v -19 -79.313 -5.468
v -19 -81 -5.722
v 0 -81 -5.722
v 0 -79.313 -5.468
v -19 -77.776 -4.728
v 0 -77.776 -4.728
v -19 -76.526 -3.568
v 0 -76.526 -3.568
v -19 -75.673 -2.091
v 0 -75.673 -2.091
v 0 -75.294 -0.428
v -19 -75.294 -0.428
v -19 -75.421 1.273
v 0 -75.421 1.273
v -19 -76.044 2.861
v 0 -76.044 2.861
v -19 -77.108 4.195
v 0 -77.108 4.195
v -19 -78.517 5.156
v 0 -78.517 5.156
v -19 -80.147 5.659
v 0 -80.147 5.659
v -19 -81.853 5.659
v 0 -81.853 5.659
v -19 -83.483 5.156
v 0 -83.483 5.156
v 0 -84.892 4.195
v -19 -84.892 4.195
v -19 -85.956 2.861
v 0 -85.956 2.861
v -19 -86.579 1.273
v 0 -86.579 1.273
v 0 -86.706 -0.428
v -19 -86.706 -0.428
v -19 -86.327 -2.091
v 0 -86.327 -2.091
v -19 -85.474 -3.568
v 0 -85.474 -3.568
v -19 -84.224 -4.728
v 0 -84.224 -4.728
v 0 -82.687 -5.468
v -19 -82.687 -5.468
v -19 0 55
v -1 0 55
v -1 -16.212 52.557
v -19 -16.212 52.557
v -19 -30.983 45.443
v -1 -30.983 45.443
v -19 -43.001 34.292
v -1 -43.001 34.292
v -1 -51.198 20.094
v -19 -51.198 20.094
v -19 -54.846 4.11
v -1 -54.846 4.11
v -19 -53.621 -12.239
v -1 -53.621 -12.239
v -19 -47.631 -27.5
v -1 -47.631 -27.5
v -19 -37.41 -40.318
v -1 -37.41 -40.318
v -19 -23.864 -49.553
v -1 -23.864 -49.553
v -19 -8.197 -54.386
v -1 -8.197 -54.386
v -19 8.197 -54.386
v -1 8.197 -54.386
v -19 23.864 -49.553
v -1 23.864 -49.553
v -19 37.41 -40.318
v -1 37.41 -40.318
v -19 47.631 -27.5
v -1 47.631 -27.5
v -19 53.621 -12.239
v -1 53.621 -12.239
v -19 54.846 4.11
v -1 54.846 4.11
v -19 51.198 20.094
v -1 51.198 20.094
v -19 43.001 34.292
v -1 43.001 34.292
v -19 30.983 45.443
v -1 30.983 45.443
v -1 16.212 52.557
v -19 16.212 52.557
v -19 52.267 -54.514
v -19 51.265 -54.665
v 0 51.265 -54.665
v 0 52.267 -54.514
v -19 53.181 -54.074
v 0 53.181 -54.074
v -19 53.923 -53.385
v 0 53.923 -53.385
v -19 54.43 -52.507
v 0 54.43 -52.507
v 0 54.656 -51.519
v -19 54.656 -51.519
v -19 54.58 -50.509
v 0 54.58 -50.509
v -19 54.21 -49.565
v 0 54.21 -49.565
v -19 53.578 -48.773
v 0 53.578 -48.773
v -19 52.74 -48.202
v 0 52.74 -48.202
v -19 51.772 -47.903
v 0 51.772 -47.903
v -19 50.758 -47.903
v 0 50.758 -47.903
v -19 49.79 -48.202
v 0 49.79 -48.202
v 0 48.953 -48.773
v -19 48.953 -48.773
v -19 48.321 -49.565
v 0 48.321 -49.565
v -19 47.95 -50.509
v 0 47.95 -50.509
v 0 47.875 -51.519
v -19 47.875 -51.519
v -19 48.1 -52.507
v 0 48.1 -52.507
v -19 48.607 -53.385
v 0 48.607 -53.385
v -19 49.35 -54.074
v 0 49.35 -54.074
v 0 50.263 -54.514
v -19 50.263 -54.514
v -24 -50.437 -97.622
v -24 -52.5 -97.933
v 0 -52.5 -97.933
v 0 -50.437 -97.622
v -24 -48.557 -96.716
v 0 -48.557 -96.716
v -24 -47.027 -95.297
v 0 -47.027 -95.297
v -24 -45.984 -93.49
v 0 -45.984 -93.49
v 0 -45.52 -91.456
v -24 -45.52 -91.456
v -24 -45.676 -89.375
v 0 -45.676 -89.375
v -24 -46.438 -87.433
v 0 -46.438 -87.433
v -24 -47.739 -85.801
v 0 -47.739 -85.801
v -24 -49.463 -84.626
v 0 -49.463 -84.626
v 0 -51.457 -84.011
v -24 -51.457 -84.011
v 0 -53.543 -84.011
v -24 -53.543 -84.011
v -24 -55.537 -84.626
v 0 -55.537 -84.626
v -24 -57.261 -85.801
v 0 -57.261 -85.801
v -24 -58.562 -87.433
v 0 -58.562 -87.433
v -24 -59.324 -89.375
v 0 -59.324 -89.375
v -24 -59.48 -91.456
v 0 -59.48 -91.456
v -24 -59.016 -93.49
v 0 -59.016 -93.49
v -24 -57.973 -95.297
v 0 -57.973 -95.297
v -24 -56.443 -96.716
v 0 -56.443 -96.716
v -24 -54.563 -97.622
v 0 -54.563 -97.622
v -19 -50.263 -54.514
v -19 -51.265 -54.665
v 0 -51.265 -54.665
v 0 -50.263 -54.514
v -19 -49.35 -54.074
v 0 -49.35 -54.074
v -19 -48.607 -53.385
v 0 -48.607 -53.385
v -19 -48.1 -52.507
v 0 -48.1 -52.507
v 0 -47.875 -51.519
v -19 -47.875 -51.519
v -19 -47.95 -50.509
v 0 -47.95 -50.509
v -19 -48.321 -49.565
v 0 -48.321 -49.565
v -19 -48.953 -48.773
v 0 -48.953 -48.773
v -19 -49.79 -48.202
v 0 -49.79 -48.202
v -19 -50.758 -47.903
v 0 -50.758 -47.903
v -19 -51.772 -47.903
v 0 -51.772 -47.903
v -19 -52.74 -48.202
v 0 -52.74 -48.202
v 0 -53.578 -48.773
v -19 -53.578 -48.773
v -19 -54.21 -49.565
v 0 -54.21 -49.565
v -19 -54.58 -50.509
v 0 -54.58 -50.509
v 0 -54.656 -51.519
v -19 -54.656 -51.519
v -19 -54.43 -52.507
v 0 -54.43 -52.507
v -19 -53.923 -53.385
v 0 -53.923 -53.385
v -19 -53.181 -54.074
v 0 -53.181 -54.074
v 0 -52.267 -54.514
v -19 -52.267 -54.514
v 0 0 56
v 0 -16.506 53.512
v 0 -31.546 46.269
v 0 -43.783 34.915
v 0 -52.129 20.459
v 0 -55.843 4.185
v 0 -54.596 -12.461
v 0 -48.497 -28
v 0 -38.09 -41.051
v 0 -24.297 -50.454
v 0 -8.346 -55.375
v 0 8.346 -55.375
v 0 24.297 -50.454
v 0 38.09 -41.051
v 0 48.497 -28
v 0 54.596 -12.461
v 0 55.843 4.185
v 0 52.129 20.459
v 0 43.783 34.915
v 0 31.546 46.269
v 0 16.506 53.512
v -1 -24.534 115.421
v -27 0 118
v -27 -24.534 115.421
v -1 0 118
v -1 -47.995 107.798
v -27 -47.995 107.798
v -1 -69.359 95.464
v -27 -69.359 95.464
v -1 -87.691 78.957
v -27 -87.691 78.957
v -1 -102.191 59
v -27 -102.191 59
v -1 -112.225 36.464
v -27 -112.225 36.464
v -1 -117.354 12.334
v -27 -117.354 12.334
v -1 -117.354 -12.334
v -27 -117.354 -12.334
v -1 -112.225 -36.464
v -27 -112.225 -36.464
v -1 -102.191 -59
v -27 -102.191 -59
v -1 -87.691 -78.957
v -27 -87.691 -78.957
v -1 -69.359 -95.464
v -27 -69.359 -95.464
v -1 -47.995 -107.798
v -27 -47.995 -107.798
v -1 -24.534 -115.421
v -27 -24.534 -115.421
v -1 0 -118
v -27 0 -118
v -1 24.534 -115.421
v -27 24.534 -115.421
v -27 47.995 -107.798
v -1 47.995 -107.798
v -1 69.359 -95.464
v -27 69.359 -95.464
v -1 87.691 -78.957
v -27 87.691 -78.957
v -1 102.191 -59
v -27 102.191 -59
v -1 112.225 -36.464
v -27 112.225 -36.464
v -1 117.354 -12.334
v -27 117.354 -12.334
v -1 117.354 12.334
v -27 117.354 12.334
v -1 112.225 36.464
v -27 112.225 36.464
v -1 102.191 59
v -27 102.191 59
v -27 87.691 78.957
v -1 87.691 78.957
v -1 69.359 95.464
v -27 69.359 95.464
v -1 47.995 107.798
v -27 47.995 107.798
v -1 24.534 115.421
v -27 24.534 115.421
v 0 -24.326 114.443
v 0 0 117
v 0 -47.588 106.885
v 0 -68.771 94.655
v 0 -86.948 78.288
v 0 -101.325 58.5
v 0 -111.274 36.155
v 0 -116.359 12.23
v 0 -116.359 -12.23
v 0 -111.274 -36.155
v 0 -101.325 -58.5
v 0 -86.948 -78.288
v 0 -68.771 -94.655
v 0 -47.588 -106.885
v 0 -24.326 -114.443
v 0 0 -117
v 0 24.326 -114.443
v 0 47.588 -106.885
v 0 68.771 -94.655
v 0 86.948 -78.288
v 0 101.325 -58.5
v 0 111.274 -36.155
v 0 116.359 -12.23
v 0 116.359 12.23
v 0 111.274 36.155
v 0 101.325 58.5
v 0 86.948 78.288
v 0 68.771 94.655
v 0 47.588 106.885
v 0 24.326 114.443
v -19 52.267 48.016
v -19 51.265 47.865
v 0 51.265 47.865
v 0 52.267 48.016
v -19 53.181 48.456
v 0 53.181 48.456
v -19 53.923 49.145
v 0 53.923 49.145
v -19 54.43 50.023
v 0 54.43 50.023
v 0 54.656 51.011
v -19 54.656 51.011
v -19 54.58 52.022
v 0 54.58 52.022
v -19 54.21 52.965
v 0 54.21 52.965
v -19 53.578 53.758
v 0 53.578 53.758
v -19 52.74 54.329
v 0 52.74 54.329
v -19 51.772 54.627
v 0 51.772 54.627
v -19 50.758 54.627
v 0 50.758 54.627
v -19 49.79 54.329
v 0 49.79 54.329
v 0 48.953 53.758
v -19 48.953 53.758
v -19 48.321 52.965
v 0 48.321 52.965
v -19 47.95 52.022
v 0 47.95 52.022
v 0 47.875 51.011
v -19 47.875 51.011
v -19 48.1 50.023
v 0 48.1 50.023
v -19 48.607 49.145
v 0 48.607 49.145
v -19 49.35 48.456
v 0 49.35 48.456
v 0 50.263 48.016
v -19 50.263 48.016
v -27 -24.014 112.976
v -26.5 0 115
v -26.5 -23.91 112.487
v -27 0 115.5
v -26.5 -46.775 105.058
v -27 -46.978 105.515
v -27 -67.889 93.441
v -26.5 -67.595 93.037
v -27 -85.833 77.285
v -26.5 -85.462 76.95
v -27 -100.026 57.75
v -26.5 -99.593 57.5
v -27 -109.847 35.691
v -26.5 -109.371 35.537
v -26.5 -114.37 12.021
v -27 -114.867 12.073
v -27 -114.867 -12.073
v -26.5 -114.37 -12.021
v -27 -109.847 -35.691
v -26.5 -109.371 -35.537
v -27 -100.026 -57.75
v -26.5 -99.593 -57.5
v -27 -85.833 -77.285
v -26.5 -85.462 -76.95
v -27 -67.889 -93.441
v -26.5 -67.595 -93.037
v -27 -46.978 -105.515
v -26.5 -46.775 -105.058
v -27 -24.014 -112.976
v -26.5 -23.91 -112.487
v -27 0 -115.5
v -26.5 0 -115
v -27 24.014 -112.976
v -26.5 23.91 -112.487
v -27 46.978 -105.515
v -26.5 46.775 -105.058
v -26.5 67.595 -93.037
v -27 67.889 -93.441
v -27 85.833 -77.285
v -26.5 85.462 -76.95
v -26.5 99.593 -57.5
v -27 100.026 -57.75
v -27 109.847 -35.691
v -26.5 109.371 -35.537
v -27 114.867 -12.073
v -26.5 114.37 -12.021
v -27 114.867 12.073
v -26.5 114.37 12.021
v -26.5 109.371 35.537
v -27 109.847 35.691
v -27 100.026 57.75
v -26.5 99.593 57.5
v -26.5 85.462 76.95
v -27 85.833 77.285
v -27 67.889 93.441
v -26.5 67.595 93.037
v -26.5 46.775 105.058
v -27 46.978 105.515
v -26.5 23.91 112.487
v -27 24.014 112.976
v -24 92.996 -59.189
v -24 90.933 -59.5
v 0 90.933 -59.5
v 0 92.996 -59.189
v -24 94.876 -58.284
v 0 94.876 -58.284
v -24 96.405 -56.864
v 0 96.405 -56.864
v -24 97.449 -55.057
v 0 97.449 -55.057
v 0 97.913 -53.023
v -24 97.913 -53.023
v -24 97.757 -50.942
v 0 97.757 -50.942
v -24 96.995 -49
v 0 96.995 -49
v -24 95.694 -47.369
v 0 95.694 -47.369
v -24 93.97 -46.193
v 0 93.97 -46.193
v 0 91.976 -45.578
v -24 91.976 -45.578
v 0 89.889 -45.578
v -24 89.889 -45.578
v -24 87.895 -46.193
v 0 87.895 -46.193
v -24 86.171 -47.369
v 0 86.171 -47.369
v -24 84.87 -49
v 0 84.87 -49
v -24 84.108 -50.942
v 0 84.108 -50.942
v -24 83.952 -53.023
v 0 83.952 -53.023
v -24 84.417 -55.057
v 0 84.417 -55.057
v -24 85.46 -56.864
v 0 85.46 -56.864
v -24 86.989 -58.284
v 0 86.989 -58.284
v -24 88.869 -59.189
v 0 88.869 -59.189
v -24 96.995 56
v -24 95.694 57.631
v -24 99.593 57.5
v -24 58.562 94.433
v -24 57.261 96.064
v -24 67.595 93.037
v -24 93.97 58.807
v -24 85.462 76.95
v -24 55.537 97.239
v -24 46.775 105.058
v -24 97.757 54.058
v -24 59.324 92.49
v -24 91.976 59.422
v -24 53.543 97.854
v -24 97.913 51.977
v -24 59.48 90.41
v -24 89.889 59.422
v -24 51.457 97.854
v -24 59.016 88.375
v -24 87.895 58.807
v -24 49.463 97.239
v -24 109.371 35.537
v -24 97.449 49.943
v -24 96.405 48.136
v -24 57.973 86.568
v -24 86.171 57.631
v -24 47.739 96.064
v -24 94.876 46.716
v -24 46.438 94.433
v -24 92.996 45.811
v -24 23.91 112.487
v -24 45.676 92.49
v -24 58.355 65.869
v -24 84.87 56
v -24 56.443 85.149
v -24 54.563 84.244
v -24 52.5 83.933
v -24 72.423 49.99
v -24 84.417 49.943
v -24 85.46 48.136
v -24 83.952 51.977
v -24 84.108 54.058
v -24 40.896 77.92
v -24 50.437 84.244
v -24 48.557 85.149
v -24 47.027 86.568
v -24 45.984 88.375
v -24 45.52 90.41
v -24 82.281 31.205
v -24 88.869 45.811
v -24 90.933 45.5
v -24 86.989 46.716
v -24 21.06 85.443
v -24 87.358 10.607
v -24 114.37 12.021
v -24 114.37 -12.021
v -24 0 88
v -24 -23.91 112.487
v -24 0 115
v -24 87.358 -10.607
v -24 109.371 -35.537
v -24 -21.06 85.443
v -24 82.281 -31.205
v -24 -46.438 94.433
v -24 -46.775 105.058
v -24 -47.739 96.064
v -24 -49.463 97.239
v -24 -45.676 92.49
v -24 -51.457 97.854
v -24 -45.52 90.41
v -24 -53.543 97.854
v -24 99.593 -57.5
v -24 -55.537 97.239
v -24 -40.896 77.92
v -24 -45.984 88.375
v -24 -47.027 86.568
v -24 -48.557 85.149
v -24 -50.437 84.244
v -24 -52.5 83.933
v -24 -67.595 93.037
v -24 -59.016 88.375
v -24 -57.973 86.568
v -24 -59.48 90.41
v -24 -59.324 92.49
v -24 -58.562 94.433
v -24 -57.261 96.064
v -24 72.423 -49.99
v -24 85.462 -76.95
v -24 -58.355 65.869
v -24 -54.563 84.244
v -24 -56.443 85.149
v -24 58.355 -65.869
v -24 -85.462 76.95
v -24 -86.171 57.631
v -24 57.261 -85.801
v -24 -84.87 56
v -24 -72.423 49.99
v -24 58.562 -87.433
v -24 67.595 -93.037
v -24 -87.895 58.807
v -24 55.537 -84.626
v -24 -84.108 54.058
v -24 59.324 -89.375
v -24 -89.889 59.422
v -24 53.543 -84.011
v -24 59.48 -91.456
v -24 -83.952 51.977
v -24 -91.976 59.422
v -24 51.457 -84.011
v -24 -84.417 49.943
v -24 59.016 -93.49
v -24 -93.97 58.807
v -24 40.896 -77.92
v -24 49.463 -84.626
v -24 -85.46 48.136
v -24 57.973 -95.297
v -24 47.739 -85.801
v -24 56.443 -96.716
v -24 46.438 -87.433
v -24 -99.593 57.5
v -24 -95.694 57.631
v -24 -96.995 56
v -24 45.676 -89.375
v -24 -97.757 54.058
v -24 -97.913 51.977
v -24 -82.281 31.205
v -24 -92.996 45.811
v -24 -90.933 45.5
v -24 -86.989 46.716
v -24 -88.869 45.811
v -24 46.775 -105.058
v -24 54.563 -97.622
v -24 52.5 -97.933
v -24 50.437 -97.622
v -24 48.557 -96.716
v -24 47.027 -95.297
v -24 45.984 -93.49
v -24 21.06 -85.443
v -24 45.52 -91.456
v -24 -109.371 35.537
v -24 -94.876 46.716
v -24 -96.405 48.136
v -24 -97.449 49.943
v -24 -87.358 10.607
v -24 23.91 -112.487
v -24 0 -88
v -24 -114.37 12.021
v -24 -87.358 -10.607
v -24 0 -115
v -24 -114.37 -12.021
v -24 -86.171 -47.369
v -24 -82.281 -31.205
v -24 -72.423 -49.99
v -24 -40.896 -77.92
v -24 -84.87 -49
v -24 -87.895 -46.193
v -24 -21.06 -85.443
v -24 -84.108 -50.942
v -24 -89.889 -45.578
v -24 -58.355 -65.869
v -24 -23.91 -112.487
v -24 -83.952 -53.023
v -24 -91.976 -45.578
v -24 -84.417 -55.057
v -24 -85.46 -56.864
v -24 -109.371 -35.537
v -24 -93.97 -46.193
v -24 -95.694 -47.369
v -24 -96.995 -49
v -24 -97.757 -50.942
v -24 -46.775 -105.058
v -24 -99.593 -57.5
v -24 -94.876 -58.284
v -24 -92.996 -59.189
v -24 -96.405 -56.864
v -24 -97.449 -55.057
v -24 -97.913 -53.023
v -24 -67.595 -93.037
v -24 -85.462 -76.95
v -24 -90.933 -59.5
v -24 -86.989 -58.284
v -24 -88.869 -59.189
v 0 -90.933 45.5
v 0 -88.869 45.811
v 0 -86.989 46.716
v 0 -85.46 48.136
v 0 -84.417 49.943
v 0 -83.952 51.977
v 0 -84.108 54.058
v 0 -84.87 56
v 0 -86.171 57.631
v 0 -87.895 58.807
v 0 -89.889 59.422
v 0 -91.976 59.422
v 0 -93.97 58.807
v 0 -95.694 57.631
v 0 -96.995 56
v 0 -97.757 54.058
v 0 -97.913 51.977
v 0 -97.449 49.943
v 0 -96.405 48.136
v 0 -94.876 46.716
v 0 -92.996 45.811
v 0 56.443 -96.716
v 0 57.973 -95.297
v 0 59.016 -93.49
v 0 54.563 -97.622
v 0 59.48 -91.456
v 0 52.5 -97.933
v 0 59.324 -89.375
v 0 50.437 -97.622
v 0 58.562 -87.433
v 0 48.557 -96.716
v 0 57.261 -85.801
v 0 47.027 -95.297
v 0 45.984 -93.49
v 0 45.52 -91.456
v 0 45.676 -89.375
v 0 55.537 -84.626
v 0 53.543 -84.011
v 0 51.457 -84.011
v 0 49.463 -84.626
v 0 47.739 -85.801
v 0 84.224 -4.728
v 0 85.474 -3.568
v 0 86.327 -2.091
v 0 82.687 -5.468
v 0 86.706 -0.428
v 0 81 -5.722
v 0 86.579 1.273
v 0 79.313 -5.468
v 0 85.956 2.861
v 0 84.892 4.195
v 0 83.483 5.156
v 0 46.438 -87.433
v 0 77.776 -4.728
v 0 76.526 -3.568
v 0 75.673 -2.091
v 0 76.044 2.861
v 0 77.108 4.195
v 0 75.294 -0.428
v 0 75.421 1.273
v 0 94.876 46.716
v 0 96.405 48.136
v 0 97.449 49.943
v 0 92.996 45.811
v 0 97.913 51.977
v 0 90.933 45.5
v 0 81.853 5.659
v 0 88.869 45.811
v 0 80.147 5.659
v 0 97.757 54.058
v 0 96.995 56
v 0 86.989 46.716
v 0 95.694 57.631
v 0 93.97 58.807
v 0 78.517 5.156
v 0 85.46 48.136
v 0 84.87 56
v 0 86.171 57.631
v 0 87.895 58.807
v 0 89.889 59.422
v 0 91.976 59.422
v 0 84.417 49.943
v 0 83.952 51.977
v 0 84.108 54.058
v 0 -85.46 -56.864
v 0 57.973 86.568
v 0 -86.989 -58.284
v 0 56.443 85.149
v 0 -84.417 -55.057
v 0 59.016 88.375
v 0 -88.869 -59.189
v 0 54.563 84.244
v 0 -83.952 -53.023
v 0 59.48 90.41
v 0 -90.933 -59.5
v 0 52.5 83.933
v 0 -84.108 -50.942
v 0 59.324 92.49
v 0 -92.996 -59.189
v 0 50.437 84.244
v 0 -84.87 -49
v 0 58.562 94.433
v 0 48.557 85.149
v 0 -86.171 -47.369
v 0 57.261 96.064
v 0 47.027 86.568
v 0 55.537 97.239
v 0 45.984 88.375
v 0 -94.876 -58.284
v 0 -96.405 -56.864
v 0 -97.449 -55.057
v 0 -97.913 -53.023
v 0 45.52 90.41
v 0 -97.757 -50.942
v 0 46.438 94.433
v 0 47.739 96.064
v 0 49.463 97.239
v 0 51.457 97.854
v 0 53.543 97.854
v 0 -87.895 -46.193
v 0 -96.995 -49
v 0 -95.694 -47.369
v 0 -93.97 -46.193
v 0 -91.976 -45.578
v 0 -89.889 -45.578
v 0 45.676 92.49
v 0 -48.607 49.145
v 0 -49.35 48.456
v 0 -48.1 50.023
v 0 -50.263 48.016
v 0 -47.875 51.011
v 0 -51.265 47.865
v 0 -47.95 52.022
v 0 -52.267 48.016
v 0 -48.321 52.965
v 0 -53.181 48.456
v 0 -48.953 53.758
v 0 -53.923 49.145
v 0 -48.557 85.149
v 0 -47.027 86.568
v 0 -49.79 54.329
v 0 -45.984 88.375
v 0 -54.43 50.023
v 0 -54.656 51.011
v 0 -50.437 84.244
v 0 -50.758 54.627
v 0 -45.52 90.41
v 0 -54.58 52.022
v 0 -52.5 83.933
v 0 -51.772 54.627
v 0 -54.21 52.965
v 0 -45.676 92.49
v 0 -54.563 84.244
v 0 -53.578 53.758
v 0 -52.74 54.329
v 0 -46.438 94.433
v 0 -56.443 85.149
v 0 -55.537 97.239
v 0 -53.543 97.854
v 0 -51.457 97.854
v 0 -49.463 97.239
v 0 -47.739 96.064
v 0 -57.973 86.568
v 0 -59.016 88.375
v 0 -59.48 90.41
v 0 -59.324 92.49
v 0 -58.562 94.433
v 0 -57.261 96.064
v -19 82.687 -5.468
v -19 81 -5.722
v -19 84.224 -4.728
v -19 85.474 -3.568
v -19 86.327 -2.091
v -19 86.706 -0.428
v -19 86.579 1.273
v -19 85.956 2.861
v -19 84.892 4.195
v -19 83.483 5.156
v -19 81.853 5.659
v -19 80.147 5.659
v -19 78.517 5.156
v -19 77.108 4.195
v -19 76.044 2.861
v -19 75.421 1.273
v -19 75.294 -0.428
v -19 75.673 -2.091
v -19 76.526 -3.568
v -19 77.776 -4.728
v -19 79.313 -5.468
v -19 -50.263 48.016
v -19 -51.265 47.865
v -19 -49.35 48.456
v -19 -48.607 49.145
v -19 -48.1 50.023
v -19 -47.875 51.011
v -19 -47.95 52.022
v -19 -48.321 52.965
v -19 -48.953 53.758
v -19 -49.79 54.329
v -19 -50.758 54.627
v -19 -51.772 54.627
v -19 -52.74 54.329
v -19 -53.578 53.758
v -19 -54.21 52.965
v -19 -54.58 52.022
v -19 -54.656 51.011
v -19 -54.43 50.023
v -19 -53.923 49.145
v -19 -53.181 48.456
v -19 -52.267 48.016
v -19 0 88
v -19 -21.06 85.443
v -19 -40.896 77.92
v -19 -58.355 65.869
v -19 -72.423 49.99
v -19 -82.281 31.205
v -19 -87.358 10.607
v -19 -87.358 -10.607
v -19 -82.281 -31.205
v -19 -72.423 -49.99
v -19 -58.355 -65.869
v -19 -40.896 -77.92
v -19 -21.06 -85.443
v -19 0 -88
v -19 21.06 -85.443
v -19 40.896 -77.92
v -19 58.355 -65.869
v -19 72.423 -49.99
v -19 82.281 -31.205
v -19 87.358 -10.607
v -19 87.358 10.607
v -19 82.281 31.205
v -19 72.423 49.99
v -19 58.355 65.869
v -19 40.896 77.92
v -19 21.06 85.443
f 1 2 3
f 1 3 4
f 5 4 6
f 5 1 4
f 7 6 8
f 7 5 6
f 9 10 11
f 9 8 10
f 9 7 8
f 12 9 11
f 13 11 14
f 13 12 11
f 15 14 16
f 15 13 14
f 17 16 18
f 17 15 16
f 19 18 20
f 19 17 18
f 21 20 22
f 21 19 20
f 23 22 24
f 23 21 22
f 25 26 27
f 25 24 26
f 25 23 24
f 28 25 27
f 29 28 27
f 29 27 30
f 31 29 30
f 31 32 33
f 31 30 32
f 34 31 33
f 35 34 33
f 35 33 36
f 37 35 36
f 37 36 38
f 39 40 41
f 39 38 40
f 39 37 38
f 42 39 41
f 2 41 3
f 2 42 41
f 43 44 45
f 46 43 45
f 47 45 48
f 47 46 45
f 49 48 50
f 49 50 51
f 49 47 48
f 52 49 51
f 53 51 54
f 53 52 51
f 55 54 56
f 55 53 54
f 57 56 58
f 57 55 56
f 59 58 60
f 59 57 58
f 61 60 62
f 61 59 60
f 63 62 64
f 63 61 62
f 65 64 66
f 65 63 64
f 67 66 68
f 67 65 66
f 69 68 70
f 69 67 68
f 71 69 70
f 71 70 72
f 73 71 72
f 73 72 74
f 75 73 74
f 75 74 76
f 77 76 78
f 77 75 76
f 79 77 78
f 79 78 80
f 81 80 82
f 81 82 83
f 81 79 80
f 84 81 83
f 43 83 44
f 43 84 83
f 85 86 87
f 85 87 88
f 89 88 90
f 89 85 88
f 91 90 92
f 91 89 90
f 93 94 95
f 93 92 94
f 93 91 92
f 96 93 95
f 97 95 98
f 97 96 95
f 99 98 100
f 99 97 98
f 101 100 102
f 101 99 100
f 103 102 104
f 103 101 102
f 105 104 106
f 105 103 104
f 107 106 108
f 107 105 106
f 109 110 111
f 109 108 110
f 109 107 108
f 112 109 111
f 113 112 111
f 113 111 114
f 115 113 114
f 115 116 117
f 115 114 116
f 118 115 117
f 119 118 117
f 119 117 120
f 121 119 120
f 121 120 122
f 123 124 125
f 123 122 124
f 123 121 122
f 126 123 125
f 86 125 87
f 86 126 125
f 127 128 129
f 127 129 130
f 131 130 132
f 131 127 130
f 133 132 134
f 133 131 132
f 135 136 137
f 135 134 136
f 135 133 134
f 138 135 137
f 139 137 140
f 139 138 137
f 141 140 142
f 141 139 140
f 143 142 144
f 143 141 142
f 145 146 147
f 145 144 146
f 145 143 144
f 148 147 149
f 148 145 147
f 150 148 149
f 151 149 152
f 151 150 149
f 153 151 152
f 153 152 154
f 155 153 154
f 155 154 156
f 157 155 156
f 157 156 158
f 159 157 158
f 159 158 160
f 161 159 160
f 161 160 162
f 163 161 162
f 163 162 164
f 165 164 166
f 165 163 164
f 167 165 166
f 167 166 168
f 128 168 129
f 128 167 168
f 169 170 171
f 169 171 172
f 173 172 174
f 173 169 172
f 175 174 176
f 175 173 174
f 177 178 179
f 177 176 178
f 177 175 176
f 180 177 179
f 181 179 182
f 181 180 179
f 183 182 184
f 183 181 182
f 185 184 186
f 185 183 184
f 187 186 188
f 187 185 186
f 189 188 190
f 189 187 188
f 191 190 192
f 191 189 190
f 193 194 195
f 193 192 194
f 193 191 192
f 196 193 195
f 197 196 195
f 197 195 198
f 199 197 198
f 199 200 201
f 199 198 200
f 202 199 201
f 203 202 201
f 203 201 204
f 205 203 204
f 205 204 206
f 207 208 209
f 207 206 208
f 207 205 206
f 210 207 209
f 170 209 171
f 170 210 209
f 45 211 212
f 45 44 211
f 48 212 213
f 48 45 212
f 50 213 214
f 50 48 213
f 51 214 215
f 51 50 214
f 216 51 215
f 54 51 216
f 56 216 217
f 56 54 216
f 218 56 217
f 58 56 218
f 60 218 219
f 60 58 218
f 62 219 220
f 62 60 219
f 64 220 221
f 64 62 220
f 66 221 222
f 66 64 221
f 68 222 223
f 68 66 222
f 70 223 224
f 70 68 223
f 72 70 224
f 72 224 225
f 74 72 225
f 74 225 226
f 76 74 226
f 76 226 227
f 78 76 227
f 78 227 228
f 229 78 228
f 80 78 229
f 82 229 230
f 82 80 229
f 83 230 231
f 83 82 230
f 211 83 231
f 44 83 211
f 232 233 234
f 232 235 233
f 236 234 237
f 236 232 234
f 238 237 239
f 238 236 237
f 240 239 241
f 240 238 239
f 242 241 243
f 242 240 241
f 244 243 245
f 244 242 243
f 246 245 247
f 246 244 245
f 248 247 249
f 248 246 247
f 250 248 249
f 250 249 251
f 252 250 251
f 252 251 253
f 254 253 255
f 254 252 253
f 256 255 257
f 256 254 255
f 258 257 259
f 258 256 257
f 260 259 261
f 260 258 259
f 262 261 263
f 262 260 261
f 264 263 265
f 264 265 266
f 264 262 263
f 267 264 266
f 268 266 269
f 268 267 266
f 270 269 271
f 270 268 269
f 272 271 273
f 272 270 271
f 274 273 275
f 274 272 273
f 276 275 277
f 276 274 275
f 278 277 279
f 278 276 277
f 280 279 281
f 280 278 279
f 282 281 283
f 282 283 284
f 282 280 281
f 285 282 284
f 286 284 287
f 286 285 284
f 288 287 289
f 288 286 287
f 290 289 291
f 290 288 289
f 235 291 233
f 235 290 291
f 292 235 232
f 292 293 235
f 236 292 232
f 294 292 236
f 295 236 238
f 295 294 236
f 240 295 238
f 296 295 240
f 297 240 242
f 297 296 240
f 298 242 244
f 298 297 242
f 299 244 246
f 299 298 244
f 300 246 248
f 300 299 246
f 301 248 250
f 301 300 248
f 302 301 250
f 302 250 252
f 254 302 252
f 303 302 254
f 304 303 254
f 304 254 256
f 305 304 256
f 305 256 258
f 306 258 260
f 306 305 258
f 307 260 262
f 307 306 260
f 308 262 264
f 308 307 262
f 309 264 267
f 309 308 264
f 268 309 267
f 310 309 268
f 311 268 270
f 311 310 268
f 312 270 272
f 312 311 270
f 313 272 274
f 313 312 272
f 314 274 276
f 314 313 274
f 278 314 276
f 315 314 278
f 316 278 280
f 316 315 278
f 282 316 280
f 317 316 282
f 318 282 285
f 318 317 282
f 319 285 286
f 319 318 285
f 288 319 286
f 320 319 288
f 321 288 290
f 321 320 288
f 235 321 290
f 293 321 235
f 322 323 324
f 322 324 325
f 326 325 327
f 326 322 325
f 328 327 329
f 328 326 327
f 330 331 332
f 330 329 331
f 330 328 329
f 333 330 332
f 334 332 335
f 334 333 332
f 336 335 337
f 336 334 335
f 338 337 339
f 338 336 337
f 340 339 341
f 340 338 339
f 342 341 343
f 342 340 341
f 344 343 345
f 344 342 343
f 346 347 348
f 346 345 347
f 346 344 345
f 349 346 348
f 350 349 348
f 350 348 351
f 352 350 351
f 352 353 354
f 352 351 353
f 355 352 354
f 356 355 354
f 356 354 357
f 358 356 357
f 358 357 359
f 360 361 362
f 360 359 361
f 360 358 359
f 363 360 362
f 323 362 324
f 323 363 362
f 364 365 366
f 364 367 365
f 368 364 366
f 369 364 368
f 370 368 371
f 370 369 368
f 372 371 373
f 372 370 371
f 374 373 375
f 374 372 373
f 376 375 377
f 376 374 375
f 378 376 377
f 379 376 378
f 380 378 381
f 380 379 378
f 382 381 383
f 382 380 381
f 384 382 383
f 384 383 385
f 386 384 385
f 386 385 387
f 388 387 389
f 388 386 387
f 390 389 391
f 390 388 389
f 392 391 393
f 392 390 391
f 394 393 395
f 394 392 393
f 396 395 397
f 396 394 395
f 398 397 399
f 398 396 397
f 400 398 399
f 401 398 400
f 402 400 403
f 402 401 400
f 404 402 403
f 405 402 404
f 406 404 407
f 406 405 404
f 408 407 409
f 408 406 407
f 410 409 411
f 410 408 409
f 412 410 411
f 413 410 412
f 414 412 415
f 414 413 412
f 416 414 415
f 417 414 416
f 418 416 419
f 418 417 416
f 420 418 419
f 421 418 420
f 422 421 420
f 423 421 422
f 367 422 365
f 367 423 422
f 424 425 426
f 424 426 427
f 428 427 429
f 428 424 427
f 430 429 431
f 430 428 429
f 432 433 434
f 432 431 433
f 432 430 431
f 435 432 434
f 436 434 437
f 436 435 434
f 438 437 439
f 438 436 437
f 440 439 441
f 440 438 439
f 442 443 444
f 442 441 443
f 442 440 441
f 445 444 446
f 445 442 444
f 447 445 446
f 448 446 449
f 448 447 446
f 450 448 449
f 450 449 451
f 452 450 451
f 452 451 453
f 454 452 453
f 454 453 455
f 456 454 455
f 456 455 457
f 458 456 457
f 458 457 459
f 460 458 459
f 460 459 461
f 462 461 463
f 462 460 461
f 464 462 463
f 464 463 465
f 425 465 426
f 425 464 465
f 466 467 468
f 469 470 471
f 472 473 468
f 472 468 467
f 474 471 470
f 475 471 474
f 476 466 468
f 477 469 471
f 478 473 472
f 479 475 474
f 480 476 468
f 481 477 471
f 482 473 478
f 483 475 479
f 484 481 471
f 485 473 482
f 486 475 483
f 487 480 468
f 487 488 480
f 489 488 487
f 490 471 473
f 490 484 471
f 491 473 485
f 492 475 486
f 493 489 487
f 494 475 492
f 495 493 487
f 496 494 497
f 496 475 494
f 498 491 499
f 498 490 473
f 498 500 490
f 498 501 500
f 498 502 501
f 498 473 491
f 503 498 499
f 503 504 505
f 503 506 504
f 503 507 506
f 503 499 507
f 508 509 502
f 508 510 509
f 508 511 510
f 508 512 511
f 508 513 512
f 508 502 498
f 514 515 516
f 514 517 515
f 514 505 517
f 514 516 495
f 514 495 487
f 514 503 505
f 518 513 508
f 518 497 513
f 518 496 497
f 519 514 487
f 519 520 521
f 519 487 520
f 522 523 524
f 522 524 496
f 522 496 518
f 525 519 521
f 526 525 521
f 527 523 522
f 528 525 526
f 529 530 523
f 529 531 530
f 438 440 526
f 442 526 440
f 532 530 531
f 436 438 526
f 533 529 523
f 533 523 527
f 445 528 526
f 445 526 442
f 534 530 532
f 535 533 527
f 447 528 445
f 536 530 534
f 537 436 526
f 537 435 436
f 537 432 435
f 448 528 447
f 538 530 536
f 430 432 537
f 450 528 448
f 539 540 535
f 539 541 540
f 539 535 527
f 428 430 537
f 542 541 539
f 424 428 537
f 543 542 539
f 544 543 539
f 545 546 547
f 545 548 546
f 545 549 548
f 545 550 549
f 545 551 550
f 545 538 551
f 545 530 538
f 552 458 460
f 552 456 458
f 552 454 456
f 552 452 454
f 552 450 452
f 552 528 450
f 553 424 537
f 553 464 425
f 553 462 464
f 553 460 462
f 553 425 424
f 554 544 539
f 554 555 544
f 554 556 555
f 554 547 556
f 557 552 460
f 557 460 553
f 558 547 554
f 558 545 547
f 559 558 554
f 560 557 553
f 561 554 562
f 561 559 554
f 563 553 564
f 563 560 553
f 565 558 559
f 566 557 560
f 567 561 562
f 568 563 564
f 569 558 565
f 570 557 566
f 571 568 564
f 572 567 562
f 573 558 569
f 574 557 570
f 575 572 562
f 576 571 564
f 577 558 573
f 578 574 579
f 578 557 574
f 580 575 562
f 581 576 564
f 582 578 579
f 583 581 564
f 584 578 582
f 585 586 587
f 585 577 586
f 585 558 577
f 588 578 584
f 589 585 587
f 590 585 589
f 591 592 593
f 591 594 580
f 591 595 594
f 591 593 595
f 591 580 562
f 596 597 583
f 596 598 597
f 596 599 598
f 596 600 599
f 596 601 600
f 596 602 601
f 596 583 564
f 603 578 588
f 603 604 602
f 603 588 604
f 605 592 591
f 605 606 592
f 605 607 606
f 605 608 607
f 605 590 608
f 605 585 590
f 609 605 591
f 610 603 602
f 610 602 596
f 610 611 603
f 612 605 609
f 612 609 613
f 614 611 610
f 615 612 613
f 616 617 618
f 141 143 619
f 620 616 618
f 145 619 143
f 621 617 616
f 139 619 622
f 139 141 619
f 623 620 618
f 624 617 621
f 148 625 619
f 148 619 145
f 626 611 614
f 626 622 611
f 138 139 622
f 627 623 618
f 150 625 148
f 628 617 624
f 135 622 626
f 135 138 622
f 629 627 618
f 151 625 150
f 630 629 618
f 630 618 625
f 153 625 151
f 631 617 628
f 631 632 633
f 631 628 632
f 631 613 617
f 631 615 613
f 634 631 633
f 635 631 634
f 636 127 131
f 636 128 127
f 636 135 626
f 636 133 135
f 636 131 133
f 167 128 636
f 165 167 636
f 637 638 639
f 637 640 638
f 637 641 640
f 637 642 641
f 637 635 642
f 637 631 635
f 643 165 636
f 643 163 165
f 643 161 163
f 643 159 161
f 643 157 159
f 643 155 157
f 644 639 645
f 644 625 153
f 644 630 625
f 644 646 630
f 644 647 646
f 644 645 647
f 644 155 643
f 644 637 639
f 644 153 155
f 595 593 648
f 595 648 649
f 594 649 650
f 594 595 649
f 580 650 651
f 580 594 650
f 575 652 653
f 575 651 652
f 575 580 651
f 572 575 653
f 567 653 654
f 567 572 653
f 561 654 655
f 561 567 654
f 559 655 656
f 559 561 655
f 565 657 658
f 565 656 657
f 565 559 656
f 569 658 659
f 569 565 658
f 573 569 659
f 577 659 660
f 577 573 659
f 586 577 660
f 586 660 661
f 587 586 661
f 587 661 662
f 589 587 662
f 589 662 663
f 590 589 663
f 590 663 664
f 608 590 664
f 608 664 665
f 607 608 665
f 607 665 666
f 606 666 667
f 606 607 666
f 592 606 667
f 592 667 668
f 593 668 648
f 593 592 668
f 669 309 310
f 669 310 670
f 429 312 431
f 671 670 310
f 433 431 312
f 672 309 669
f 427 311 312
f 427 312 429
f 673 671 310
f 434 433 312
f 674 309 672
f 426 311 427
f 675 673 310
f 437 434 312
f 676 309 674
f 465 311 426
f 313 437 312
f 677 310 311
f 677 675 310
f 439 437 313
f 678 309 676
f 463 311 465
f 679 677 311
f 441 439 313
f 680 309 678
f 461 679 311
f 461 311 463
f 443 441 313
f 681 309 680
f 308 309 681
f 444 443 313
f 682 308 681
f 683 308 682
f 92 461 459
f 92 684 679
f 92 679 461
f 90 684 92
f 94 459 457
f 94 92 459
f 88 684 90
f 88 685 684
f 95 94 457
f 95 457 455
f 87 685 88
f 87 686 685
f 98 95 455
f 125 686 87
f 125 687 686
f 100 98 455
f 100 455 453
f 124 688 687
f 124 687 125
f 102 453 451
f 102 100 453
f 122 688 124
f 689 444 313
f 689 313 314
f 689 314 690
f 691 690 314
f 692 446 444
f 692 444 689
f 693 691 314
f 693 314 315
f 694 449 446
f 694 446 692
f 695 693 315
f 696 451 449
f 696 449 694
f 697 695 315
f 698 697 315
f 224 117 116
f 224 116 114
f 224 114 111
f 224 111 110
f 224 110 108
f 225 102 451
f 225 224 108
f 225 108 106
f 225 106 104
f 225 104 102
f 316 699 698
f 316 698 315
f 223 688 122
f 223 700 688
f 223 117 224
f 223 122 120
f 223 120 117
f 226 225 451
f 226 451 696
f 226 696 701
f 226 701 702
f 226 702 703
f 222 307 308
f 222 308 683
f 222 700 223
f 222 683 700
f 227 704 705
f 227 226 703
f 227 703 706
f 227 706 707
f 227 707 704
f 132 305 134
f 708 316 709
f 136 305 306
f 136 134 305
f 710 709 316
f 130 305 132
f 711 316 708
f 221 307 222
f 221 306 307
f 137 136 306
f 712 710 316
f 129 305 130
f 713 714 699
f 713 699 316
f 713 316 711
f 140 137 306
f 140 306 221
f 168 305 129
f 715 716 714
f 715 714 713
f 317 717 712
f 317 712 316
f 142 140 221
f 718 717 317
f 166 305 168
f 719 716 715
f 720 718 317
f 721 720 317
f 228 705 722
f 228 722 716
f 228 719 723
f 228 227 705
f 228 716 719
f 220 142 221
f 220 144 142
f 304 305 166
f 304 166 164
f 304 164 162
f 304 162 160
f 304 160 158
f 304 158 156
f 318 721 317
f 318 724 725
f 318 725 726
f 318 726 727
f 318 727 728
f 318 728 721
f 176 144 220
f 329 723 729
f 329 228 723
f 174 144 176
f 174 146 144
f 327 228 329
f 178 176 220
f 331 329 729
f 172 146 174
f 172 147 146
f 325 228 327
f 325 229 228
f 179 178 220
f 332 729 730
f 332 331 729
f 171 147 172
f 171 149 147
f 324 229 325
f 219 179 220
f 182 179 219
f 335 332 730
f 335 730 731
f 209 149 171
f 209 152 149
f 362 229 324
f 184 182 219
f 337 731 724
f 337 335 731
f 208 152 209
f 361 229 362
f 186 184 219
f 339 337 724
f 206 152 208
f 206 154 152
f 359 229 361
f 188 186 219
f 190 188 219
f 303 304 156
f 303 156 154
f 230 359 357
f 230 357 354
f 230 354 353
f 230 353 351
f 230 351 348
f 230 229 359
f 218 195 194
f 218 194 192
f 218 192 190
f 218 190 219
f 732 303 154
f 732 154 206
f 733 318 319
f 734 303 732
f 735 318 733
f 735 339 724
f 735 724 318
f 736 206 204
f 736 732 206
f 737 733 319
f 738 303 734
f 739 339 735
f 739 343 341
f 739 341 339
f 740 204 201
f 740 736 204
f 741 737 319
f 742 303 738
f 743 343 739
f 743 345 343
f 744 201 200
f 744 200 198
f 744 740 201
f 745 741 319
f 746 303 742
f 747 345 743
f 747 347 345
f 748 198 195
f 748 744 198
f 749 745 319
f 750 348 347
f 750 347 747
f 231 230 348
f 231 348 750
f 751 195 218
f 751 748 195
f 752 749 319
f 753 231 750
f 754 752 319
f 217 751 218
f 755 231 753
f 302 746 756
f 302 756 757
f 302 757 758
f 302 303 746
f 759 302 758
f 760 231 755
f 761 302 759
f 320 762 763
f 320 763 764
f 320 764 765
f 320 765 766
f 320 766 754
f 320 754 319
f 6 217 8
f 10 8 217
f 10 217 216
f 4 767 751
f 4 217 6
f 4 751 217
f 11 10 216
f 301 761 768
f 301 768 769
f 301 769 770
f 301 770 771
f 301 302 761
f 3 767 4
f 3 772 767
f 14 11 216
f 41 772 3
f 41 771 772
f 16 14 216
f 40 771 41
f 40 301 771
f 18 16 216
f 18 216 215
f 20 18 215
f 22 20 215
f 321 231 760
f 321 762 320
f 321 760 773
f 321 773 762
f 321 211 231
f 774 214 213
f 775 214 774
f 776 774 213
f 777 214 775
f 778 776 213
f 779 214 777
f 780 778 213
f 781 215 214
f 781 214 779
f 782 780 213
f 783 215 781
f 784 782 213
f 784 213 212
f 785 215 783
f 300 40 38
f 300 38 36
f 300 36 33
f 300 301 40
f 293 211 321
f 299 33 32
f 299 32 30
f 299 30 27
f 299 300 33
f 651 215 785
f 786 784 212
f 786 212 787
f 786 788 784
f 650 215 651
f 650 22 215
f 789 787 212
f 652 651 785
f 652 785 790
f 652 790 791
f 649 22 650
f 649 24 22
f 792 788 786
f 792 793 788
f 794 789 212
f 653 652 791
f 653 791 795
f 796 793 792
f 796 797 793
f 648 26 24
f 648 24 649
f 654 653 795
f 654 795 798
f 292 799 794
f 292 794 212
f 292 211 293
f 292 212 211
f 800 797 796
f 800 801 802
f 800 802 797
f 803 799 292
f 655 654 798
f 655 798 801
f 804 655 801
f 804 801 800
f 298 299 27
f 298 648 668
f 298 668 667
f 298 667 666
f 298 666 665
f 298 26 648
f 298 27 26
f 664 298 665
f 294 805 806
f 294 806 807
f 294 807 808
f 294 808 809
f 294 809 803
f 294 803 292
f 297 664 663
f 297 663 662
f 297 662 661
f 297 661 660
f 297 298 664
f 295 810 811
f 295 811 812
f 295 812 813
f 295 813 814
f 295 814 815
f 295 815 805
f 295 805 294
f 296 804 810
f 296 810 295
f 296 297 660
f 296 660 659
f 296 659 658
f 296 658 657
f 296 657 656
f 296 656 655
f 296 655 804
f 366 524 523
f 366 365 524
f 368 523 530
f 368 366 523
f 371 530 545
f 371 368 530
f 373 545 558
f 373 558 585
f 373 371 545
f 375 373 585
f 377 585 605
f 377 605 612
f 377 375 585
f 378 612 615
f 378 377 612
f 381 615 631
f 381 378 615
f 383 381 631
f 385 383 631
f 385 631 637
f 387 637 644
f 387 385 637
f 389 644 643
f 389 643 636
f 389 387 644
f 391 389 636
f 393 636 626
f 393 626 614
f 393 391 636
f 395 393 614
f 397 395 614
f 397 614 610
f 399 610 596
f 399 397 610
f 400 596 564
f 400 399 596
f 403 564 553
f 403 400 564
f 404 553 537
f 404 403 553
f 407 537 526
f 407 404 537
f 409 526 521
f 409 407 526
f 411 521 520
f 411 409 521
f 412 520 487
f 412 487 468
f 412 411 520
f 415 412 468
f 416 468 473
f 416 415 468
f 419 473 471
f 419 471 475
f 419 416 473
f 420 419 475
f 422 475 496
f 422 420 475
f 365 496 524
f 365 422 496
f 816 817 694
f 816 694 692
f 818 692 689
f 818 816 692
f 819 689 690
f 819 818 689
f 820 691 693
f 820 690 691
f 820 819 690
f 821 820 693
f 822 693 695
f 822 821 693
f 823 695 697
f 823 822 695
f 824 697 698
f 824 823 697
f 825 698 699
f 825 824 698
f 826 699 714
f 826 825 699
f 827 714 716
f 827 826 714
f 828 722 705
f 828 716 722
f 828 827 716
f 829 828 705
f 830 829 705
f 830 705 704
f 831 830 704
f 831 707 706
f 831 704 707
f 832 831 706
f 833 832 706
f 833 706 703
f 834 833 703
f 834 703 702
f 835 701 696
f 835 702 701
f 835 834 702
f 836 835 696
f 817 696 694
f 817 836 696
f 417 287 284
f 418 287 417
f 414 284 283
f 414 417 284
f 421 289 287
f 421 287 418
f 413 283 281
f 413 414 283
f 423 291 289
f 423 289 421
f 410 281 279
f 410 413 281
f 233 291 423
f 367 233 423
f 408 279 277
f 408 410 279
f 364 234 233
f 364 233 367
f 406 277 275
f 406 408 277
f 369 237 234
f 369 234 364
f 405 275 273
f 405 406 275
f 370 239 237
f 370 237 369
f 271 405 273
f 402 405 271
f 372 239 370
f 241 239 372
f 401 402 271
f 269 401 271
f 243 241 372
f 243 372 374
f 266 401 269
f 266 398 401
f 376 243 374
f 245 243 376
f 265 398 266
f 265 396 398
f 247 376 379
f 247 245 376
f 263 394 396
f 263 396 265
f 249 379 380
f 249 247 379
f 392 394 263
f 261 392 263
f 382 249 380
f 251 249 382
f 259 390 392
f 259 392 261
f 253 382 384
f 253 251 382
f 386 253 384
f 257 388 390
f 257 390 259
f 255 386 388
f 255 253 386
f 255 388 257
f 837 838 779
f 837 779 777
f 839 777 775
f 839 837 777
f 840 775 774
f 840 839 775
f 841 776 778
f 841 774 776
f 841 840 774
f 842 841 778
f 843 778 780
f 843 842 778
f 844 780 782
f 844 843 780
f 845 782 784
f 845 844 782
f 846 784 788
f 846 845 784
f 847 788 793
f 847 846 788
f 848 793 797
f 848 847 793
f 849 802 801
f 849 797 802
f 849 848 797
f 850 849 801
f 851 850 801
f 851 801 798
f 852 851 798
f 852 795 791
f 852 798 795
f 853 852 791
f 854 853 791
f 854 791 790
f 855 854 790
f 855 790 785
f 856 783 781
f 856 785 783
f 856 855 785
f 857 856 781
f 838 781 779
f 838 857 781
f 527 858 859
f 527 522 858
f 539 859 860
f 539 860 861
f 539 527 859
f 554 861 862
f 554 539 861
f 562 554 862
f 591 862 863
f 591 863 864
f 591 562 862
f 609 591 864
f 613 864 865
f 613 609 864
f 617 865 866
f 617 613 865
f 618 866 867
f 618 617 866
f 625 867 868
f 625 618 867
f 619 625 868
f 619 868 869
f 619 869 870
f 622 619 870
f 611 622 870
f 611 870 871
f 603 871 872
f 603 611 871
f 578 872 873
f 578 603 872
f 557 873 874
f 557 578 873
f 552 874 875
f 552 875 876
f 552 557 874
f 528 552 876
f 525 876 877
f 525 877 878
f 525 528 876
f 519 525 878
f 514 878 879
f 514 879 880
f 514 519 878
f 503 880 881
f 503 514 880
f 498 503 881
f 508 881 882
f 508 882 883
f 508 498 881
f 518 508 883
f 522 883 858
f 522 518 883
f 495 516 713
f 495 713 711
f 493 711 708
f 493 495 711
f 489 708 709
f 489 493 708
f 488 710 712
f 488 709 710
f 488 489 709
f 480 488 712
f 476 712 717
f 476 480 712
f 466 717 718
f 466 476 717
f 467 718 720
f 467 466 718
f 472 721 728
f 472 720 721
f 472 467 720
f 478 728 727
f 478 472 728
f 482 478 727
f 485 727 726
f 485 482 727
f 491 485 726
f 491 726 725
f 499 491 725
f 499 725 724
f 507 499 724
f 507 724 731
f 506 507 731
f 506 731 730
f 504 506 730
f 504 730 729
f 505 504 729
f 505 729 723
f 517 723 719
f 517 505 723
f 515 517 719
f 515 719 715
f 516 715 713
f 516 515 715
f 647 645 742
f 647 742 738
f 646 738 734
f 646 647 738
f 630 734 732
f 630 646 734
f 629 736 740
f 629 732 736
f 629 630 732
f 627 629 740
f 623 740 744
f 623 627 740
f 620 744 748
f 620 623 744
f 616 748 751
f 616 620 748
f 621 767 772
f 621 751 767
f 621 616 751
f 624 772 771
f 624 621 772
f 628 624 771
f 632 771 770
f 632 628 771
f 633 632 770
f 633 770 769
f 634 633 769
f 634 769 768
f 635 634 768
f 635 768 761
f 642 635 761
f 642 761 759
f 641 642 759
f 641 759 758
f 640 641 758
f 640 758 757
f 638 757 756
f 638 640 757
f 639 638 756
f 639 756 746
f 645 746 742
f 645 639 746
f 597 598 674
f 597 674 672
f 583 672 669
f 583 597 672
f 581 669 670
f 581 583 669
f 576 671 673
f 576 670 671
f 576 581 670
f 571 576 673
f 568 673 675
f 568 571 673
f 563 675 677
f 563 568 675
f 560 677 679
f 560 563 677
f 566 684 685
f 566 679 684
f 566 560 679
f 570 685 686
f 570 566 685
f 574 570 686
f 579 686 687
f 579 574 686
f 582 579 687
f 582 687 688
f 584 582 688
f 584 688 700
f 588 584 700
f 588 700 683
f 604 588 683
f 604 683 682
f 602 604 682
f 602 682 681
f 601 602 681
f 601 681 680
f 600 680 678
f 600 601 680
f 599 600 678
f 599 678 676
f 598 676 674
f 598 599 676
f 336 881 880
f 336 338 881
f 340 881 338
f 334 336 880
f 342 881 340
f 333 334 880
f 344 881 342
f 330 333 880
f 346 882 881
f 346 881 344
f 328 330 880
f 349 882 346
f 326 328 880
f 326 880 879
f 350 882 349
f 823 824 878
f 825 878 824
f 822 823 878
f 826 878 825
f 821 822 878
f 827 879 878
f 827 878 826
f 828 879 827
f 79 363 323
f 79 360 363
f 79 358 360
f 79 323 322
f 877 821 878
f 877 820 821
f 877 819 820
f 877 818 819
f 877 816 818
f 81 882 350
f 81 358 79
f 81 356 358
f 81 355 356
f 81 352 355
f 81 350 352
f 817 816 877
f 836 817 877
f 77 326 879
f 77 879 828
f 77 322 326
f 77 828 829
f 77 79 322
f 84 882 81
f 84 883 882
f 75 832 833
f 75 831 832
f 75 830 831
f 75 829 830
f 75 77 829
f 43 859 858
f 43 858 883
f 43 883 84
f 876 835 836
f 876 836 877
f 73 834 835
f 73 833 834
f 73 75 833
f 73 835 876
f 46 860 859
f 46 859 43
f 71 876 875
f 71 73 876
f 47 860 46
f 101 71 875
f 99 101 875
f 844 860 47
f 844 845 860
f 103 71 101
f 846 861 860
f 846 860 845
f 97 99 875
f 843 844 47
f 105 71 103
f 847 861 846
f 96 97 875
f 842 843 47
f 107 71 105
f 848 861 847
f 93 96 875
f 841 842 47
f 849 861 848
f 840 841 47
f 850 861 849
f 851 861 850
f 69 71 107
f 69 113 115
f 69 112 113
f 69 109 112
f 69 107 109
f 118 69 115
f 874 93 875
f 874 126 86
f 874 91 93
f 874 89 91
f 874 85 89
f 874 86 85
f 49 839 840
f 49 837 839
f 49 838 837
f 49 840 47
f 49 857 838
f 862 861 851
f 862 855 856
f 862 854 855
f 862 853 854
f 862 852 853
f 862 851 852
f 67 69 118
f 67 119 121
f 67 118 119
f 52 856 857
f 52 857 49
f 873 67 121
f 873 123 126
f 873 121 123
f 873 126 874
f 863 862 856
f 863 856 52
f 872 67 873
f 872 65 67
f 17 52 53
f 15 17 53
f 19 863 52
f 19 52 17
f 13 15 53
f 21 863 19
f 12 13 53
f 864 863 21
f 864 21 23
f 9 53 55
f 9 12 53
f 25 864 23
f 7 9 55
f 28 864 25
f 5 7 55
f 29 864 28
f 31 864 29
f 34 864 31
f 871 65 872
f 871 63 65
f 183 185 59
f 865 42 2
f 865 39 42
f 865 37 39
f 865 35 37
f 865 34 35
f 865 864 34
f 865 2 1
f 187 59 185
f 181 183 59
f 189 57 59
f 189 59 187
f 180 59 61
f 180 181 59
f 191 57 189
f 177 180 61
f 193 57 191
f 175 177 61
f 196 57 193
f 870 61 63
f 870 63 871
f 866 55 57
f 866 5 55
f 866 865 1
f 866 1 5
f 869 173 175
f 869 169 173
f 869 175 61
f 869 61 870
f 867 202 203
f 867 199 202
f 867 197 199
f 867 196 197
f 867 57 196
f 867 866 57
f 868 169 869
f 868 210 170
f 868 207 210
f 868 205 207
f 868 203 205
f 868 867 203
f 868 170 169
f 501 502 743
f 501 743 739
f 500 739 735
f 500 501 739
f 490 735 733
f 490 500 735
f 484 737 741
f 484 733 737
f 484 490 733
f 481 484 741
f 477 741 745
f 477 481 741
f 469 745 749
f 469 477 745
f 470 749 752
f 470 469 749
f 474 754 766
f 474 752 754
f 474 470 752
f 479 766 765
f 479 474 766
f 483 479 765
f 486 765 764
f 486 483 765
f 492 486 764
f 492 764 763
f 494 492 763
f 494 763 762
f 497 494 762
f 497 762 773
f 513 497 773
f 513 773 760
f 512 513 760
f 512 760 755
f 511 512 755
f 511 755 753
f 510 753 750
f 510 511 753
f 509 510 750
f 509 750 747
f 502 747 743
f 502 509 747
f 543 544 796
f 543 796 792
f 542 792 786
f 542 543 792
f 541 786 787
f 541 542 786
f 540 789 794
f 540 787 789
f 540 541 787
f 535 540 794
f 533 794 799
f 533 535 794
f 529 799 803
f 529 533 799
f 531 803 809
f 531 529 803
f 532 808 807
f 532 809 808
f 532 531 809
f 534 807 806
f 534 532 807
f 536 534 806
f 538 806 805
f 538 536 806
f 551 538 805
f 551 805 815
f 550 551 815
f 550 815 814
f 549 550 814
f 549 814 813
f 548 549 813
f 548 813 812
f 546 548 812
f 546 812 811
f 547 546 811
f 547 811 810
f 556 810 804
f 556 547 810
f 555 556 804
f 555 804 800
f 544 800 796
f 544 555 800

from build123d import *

# Parameters (mm, degrees)
CUT_EXTRUDE_1_DEPTH      = 170.04733065
CUT_EXTRUDE_1_DEPTH_BACK = 170.04733065
SKETCH_2_R               = 7
CUT_EXTRUDE_2_DEPTH      = 170.04733065
CUT_EXTRUDE_2_DEPTH_BACK = 170.04733065
SKETCH_3_R               = 3.4
CUT_EXTRUDE_3_DEPTH      = 170.04733065
CUT_EXTRUDE_3_DEPTH_BACK = 170.04733065
SKETCH_4_R               = 5.7225


with BuildPart() as part:
    # ｽｹｯﾁ1 → 回転1 (revolve)
    with BuildSketch(Plane.XY, mode=Mode.PRIVATE) as revolve_1_sk:
        Polygon((0, 117), (0, 56), (-1, 55), (-19, 55), (-19, 88), (-24, 88), (-24, 115), (-26.5, 115), (-27, 115.5), (-27, 118), (-1, 118), align=None)
    revolve(revolve_1_sk.sketch.rotate(Axis((-27, 0, 0), (1, 0, 0)), 90), axis=Axis((-27, 0, 0), (1, 0, 0)))

    # ｽｹｯﾁ2 → ｶｯﾄ - 押し出し1 (cut, two sides: drawn at the far end of the back side and taken through both)
    with BuildSketch(Plane(origin=(0, 0, 0), x_dir=(0, 0, -1), z_dir=(1, 0, 0)).offset(-CUT_EXTRUDE_1_DEPTH_BACK)):
        with Locations((90.932667397, 52.5)):
            Circle(SKETCH_2_R)
        with Locations((52.5, 90.932667397)):
            Circle(SKETCH_2_R)
        with Locations((-52.5, 90.932667397)):
            Circle(SKETCH_2_R)
        with Locations((-90.932667397, 52.5)):
            Circle(SKETCH_2_R)
        with Locations((-90.932667397, -52.5)):
            Circle(SKETCH_2_R)
        with Locations((-52.5, -90.932667397)):
            Circle(SKETCH_2_R)
        with Locations((52.5, -90.932667397)):
            Circle(SKETCH_2_R)
        with Locations((90.932667397, -52.5)):
            Circle(SKETCH_2_R)
    extrude(amount=CUT_EXTRUDE_1_DEPTH + CUT_EXTRUDE_1_DEPTH_BACK, mode=Mode.SUBTRACT)

    # ｽｹｯﾁ3 → ｶｯﾄ - 押し出し2 (cut, two sides: drawn at the far end of the back side and taken through both)
    with BuildSketch(Plane(origin=(0, 0, 0), x_dir=(0, 0, -1), z_dir=(1, 0, 0)).offset(-CUT_EXTRUDE_2_DEPTH_BACK)):
        with Locations((51.265241636, 51.265241636)):
            Circle(SKETCH_3_R)
        with Locations((-51.265241636, 51.265241636)):
            Circle(SKETCH_3_R)
        with Locations((-51.265241636, -51.265241636)):
            Circle(SKETCH_3_R)
        with Locations((51.265241636, -51.265241636)):
            Circle(SKETCH_3_R)
    extrude(amount=CUT_EXTRUDE_2_DEPTH + CUT_EXTRUDE_2_DEPTH_BACK, mode=Mode.SUBTRACT)

    # ｽｹｯﾁ4 → ｶｯﾄ - 押し出し3 (cut, two sides: drawn at the far end of the back side and taken through both)
    with BuildSketch(Plane(origin=(0, 0, 0), x_dir=(0, 0, -1), z_dir=(1, 0, 0)).offset(-CUT_EXTRUDE_3_DEPTH_BACK)):
        with Locations((0, 81)):
            Circle(SKETCH_4_R)
        with Locations((0, -81)):
            Circle(SKETCH_4_R)
    extrude(amount=CUT_EXTRUDE_3_DEPTH + CUT_EXTRUDE_3_DEPTH_BACK, mode=Mode.SUBTRACT)


solid = part.part
